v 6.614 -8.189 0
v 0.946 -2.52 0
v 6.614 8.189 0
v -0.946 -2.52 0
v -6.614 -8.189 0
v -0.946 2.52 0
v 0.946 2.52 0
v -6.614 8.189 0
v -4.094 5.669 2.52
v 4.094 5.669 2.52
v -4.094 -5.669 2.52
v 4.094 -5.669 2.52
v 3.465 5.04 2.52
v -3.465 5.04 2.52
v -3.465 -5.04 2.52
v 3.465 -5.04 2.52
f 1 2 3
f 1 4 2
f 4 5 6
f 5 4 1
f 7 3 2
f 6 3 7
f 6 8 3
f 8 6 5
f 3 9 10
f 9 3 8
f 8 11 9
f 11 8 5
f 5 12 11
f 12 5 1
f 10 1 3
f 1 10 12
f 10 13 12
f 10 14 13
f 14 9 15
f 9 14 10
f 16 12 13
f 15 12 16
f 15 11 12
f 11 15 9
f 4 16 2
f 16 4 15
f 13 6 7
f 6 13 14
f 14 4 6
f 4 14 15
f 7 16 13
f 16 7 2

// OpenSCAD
module flare(dims) {
  hull()
    for (a = [-1, 1], b = [-1, 1])
      translate([dims.x*a/2, dims.y*b/2, dims.z])
        scale([1, 1, -1])
          linear_extrude(dims.z, scale=0)
            square(dims.z*2, dims.z*2, center=true);
}

// For convenience, everything below is specified in
// sixteenths of an inch. I convert to millimeters at
// the outermost scope.
to_mm = 16.0 / 25.4;

scale([to_mm, to_mm, to_mm]) {
  difference() {
    translate([0, 0, 4])
      scale([1, 1, -1])
        flare([13, 18, 4]);
    translate([0, 0, -0.001])
      flare([3, 8, 4.002]);
  }
}
